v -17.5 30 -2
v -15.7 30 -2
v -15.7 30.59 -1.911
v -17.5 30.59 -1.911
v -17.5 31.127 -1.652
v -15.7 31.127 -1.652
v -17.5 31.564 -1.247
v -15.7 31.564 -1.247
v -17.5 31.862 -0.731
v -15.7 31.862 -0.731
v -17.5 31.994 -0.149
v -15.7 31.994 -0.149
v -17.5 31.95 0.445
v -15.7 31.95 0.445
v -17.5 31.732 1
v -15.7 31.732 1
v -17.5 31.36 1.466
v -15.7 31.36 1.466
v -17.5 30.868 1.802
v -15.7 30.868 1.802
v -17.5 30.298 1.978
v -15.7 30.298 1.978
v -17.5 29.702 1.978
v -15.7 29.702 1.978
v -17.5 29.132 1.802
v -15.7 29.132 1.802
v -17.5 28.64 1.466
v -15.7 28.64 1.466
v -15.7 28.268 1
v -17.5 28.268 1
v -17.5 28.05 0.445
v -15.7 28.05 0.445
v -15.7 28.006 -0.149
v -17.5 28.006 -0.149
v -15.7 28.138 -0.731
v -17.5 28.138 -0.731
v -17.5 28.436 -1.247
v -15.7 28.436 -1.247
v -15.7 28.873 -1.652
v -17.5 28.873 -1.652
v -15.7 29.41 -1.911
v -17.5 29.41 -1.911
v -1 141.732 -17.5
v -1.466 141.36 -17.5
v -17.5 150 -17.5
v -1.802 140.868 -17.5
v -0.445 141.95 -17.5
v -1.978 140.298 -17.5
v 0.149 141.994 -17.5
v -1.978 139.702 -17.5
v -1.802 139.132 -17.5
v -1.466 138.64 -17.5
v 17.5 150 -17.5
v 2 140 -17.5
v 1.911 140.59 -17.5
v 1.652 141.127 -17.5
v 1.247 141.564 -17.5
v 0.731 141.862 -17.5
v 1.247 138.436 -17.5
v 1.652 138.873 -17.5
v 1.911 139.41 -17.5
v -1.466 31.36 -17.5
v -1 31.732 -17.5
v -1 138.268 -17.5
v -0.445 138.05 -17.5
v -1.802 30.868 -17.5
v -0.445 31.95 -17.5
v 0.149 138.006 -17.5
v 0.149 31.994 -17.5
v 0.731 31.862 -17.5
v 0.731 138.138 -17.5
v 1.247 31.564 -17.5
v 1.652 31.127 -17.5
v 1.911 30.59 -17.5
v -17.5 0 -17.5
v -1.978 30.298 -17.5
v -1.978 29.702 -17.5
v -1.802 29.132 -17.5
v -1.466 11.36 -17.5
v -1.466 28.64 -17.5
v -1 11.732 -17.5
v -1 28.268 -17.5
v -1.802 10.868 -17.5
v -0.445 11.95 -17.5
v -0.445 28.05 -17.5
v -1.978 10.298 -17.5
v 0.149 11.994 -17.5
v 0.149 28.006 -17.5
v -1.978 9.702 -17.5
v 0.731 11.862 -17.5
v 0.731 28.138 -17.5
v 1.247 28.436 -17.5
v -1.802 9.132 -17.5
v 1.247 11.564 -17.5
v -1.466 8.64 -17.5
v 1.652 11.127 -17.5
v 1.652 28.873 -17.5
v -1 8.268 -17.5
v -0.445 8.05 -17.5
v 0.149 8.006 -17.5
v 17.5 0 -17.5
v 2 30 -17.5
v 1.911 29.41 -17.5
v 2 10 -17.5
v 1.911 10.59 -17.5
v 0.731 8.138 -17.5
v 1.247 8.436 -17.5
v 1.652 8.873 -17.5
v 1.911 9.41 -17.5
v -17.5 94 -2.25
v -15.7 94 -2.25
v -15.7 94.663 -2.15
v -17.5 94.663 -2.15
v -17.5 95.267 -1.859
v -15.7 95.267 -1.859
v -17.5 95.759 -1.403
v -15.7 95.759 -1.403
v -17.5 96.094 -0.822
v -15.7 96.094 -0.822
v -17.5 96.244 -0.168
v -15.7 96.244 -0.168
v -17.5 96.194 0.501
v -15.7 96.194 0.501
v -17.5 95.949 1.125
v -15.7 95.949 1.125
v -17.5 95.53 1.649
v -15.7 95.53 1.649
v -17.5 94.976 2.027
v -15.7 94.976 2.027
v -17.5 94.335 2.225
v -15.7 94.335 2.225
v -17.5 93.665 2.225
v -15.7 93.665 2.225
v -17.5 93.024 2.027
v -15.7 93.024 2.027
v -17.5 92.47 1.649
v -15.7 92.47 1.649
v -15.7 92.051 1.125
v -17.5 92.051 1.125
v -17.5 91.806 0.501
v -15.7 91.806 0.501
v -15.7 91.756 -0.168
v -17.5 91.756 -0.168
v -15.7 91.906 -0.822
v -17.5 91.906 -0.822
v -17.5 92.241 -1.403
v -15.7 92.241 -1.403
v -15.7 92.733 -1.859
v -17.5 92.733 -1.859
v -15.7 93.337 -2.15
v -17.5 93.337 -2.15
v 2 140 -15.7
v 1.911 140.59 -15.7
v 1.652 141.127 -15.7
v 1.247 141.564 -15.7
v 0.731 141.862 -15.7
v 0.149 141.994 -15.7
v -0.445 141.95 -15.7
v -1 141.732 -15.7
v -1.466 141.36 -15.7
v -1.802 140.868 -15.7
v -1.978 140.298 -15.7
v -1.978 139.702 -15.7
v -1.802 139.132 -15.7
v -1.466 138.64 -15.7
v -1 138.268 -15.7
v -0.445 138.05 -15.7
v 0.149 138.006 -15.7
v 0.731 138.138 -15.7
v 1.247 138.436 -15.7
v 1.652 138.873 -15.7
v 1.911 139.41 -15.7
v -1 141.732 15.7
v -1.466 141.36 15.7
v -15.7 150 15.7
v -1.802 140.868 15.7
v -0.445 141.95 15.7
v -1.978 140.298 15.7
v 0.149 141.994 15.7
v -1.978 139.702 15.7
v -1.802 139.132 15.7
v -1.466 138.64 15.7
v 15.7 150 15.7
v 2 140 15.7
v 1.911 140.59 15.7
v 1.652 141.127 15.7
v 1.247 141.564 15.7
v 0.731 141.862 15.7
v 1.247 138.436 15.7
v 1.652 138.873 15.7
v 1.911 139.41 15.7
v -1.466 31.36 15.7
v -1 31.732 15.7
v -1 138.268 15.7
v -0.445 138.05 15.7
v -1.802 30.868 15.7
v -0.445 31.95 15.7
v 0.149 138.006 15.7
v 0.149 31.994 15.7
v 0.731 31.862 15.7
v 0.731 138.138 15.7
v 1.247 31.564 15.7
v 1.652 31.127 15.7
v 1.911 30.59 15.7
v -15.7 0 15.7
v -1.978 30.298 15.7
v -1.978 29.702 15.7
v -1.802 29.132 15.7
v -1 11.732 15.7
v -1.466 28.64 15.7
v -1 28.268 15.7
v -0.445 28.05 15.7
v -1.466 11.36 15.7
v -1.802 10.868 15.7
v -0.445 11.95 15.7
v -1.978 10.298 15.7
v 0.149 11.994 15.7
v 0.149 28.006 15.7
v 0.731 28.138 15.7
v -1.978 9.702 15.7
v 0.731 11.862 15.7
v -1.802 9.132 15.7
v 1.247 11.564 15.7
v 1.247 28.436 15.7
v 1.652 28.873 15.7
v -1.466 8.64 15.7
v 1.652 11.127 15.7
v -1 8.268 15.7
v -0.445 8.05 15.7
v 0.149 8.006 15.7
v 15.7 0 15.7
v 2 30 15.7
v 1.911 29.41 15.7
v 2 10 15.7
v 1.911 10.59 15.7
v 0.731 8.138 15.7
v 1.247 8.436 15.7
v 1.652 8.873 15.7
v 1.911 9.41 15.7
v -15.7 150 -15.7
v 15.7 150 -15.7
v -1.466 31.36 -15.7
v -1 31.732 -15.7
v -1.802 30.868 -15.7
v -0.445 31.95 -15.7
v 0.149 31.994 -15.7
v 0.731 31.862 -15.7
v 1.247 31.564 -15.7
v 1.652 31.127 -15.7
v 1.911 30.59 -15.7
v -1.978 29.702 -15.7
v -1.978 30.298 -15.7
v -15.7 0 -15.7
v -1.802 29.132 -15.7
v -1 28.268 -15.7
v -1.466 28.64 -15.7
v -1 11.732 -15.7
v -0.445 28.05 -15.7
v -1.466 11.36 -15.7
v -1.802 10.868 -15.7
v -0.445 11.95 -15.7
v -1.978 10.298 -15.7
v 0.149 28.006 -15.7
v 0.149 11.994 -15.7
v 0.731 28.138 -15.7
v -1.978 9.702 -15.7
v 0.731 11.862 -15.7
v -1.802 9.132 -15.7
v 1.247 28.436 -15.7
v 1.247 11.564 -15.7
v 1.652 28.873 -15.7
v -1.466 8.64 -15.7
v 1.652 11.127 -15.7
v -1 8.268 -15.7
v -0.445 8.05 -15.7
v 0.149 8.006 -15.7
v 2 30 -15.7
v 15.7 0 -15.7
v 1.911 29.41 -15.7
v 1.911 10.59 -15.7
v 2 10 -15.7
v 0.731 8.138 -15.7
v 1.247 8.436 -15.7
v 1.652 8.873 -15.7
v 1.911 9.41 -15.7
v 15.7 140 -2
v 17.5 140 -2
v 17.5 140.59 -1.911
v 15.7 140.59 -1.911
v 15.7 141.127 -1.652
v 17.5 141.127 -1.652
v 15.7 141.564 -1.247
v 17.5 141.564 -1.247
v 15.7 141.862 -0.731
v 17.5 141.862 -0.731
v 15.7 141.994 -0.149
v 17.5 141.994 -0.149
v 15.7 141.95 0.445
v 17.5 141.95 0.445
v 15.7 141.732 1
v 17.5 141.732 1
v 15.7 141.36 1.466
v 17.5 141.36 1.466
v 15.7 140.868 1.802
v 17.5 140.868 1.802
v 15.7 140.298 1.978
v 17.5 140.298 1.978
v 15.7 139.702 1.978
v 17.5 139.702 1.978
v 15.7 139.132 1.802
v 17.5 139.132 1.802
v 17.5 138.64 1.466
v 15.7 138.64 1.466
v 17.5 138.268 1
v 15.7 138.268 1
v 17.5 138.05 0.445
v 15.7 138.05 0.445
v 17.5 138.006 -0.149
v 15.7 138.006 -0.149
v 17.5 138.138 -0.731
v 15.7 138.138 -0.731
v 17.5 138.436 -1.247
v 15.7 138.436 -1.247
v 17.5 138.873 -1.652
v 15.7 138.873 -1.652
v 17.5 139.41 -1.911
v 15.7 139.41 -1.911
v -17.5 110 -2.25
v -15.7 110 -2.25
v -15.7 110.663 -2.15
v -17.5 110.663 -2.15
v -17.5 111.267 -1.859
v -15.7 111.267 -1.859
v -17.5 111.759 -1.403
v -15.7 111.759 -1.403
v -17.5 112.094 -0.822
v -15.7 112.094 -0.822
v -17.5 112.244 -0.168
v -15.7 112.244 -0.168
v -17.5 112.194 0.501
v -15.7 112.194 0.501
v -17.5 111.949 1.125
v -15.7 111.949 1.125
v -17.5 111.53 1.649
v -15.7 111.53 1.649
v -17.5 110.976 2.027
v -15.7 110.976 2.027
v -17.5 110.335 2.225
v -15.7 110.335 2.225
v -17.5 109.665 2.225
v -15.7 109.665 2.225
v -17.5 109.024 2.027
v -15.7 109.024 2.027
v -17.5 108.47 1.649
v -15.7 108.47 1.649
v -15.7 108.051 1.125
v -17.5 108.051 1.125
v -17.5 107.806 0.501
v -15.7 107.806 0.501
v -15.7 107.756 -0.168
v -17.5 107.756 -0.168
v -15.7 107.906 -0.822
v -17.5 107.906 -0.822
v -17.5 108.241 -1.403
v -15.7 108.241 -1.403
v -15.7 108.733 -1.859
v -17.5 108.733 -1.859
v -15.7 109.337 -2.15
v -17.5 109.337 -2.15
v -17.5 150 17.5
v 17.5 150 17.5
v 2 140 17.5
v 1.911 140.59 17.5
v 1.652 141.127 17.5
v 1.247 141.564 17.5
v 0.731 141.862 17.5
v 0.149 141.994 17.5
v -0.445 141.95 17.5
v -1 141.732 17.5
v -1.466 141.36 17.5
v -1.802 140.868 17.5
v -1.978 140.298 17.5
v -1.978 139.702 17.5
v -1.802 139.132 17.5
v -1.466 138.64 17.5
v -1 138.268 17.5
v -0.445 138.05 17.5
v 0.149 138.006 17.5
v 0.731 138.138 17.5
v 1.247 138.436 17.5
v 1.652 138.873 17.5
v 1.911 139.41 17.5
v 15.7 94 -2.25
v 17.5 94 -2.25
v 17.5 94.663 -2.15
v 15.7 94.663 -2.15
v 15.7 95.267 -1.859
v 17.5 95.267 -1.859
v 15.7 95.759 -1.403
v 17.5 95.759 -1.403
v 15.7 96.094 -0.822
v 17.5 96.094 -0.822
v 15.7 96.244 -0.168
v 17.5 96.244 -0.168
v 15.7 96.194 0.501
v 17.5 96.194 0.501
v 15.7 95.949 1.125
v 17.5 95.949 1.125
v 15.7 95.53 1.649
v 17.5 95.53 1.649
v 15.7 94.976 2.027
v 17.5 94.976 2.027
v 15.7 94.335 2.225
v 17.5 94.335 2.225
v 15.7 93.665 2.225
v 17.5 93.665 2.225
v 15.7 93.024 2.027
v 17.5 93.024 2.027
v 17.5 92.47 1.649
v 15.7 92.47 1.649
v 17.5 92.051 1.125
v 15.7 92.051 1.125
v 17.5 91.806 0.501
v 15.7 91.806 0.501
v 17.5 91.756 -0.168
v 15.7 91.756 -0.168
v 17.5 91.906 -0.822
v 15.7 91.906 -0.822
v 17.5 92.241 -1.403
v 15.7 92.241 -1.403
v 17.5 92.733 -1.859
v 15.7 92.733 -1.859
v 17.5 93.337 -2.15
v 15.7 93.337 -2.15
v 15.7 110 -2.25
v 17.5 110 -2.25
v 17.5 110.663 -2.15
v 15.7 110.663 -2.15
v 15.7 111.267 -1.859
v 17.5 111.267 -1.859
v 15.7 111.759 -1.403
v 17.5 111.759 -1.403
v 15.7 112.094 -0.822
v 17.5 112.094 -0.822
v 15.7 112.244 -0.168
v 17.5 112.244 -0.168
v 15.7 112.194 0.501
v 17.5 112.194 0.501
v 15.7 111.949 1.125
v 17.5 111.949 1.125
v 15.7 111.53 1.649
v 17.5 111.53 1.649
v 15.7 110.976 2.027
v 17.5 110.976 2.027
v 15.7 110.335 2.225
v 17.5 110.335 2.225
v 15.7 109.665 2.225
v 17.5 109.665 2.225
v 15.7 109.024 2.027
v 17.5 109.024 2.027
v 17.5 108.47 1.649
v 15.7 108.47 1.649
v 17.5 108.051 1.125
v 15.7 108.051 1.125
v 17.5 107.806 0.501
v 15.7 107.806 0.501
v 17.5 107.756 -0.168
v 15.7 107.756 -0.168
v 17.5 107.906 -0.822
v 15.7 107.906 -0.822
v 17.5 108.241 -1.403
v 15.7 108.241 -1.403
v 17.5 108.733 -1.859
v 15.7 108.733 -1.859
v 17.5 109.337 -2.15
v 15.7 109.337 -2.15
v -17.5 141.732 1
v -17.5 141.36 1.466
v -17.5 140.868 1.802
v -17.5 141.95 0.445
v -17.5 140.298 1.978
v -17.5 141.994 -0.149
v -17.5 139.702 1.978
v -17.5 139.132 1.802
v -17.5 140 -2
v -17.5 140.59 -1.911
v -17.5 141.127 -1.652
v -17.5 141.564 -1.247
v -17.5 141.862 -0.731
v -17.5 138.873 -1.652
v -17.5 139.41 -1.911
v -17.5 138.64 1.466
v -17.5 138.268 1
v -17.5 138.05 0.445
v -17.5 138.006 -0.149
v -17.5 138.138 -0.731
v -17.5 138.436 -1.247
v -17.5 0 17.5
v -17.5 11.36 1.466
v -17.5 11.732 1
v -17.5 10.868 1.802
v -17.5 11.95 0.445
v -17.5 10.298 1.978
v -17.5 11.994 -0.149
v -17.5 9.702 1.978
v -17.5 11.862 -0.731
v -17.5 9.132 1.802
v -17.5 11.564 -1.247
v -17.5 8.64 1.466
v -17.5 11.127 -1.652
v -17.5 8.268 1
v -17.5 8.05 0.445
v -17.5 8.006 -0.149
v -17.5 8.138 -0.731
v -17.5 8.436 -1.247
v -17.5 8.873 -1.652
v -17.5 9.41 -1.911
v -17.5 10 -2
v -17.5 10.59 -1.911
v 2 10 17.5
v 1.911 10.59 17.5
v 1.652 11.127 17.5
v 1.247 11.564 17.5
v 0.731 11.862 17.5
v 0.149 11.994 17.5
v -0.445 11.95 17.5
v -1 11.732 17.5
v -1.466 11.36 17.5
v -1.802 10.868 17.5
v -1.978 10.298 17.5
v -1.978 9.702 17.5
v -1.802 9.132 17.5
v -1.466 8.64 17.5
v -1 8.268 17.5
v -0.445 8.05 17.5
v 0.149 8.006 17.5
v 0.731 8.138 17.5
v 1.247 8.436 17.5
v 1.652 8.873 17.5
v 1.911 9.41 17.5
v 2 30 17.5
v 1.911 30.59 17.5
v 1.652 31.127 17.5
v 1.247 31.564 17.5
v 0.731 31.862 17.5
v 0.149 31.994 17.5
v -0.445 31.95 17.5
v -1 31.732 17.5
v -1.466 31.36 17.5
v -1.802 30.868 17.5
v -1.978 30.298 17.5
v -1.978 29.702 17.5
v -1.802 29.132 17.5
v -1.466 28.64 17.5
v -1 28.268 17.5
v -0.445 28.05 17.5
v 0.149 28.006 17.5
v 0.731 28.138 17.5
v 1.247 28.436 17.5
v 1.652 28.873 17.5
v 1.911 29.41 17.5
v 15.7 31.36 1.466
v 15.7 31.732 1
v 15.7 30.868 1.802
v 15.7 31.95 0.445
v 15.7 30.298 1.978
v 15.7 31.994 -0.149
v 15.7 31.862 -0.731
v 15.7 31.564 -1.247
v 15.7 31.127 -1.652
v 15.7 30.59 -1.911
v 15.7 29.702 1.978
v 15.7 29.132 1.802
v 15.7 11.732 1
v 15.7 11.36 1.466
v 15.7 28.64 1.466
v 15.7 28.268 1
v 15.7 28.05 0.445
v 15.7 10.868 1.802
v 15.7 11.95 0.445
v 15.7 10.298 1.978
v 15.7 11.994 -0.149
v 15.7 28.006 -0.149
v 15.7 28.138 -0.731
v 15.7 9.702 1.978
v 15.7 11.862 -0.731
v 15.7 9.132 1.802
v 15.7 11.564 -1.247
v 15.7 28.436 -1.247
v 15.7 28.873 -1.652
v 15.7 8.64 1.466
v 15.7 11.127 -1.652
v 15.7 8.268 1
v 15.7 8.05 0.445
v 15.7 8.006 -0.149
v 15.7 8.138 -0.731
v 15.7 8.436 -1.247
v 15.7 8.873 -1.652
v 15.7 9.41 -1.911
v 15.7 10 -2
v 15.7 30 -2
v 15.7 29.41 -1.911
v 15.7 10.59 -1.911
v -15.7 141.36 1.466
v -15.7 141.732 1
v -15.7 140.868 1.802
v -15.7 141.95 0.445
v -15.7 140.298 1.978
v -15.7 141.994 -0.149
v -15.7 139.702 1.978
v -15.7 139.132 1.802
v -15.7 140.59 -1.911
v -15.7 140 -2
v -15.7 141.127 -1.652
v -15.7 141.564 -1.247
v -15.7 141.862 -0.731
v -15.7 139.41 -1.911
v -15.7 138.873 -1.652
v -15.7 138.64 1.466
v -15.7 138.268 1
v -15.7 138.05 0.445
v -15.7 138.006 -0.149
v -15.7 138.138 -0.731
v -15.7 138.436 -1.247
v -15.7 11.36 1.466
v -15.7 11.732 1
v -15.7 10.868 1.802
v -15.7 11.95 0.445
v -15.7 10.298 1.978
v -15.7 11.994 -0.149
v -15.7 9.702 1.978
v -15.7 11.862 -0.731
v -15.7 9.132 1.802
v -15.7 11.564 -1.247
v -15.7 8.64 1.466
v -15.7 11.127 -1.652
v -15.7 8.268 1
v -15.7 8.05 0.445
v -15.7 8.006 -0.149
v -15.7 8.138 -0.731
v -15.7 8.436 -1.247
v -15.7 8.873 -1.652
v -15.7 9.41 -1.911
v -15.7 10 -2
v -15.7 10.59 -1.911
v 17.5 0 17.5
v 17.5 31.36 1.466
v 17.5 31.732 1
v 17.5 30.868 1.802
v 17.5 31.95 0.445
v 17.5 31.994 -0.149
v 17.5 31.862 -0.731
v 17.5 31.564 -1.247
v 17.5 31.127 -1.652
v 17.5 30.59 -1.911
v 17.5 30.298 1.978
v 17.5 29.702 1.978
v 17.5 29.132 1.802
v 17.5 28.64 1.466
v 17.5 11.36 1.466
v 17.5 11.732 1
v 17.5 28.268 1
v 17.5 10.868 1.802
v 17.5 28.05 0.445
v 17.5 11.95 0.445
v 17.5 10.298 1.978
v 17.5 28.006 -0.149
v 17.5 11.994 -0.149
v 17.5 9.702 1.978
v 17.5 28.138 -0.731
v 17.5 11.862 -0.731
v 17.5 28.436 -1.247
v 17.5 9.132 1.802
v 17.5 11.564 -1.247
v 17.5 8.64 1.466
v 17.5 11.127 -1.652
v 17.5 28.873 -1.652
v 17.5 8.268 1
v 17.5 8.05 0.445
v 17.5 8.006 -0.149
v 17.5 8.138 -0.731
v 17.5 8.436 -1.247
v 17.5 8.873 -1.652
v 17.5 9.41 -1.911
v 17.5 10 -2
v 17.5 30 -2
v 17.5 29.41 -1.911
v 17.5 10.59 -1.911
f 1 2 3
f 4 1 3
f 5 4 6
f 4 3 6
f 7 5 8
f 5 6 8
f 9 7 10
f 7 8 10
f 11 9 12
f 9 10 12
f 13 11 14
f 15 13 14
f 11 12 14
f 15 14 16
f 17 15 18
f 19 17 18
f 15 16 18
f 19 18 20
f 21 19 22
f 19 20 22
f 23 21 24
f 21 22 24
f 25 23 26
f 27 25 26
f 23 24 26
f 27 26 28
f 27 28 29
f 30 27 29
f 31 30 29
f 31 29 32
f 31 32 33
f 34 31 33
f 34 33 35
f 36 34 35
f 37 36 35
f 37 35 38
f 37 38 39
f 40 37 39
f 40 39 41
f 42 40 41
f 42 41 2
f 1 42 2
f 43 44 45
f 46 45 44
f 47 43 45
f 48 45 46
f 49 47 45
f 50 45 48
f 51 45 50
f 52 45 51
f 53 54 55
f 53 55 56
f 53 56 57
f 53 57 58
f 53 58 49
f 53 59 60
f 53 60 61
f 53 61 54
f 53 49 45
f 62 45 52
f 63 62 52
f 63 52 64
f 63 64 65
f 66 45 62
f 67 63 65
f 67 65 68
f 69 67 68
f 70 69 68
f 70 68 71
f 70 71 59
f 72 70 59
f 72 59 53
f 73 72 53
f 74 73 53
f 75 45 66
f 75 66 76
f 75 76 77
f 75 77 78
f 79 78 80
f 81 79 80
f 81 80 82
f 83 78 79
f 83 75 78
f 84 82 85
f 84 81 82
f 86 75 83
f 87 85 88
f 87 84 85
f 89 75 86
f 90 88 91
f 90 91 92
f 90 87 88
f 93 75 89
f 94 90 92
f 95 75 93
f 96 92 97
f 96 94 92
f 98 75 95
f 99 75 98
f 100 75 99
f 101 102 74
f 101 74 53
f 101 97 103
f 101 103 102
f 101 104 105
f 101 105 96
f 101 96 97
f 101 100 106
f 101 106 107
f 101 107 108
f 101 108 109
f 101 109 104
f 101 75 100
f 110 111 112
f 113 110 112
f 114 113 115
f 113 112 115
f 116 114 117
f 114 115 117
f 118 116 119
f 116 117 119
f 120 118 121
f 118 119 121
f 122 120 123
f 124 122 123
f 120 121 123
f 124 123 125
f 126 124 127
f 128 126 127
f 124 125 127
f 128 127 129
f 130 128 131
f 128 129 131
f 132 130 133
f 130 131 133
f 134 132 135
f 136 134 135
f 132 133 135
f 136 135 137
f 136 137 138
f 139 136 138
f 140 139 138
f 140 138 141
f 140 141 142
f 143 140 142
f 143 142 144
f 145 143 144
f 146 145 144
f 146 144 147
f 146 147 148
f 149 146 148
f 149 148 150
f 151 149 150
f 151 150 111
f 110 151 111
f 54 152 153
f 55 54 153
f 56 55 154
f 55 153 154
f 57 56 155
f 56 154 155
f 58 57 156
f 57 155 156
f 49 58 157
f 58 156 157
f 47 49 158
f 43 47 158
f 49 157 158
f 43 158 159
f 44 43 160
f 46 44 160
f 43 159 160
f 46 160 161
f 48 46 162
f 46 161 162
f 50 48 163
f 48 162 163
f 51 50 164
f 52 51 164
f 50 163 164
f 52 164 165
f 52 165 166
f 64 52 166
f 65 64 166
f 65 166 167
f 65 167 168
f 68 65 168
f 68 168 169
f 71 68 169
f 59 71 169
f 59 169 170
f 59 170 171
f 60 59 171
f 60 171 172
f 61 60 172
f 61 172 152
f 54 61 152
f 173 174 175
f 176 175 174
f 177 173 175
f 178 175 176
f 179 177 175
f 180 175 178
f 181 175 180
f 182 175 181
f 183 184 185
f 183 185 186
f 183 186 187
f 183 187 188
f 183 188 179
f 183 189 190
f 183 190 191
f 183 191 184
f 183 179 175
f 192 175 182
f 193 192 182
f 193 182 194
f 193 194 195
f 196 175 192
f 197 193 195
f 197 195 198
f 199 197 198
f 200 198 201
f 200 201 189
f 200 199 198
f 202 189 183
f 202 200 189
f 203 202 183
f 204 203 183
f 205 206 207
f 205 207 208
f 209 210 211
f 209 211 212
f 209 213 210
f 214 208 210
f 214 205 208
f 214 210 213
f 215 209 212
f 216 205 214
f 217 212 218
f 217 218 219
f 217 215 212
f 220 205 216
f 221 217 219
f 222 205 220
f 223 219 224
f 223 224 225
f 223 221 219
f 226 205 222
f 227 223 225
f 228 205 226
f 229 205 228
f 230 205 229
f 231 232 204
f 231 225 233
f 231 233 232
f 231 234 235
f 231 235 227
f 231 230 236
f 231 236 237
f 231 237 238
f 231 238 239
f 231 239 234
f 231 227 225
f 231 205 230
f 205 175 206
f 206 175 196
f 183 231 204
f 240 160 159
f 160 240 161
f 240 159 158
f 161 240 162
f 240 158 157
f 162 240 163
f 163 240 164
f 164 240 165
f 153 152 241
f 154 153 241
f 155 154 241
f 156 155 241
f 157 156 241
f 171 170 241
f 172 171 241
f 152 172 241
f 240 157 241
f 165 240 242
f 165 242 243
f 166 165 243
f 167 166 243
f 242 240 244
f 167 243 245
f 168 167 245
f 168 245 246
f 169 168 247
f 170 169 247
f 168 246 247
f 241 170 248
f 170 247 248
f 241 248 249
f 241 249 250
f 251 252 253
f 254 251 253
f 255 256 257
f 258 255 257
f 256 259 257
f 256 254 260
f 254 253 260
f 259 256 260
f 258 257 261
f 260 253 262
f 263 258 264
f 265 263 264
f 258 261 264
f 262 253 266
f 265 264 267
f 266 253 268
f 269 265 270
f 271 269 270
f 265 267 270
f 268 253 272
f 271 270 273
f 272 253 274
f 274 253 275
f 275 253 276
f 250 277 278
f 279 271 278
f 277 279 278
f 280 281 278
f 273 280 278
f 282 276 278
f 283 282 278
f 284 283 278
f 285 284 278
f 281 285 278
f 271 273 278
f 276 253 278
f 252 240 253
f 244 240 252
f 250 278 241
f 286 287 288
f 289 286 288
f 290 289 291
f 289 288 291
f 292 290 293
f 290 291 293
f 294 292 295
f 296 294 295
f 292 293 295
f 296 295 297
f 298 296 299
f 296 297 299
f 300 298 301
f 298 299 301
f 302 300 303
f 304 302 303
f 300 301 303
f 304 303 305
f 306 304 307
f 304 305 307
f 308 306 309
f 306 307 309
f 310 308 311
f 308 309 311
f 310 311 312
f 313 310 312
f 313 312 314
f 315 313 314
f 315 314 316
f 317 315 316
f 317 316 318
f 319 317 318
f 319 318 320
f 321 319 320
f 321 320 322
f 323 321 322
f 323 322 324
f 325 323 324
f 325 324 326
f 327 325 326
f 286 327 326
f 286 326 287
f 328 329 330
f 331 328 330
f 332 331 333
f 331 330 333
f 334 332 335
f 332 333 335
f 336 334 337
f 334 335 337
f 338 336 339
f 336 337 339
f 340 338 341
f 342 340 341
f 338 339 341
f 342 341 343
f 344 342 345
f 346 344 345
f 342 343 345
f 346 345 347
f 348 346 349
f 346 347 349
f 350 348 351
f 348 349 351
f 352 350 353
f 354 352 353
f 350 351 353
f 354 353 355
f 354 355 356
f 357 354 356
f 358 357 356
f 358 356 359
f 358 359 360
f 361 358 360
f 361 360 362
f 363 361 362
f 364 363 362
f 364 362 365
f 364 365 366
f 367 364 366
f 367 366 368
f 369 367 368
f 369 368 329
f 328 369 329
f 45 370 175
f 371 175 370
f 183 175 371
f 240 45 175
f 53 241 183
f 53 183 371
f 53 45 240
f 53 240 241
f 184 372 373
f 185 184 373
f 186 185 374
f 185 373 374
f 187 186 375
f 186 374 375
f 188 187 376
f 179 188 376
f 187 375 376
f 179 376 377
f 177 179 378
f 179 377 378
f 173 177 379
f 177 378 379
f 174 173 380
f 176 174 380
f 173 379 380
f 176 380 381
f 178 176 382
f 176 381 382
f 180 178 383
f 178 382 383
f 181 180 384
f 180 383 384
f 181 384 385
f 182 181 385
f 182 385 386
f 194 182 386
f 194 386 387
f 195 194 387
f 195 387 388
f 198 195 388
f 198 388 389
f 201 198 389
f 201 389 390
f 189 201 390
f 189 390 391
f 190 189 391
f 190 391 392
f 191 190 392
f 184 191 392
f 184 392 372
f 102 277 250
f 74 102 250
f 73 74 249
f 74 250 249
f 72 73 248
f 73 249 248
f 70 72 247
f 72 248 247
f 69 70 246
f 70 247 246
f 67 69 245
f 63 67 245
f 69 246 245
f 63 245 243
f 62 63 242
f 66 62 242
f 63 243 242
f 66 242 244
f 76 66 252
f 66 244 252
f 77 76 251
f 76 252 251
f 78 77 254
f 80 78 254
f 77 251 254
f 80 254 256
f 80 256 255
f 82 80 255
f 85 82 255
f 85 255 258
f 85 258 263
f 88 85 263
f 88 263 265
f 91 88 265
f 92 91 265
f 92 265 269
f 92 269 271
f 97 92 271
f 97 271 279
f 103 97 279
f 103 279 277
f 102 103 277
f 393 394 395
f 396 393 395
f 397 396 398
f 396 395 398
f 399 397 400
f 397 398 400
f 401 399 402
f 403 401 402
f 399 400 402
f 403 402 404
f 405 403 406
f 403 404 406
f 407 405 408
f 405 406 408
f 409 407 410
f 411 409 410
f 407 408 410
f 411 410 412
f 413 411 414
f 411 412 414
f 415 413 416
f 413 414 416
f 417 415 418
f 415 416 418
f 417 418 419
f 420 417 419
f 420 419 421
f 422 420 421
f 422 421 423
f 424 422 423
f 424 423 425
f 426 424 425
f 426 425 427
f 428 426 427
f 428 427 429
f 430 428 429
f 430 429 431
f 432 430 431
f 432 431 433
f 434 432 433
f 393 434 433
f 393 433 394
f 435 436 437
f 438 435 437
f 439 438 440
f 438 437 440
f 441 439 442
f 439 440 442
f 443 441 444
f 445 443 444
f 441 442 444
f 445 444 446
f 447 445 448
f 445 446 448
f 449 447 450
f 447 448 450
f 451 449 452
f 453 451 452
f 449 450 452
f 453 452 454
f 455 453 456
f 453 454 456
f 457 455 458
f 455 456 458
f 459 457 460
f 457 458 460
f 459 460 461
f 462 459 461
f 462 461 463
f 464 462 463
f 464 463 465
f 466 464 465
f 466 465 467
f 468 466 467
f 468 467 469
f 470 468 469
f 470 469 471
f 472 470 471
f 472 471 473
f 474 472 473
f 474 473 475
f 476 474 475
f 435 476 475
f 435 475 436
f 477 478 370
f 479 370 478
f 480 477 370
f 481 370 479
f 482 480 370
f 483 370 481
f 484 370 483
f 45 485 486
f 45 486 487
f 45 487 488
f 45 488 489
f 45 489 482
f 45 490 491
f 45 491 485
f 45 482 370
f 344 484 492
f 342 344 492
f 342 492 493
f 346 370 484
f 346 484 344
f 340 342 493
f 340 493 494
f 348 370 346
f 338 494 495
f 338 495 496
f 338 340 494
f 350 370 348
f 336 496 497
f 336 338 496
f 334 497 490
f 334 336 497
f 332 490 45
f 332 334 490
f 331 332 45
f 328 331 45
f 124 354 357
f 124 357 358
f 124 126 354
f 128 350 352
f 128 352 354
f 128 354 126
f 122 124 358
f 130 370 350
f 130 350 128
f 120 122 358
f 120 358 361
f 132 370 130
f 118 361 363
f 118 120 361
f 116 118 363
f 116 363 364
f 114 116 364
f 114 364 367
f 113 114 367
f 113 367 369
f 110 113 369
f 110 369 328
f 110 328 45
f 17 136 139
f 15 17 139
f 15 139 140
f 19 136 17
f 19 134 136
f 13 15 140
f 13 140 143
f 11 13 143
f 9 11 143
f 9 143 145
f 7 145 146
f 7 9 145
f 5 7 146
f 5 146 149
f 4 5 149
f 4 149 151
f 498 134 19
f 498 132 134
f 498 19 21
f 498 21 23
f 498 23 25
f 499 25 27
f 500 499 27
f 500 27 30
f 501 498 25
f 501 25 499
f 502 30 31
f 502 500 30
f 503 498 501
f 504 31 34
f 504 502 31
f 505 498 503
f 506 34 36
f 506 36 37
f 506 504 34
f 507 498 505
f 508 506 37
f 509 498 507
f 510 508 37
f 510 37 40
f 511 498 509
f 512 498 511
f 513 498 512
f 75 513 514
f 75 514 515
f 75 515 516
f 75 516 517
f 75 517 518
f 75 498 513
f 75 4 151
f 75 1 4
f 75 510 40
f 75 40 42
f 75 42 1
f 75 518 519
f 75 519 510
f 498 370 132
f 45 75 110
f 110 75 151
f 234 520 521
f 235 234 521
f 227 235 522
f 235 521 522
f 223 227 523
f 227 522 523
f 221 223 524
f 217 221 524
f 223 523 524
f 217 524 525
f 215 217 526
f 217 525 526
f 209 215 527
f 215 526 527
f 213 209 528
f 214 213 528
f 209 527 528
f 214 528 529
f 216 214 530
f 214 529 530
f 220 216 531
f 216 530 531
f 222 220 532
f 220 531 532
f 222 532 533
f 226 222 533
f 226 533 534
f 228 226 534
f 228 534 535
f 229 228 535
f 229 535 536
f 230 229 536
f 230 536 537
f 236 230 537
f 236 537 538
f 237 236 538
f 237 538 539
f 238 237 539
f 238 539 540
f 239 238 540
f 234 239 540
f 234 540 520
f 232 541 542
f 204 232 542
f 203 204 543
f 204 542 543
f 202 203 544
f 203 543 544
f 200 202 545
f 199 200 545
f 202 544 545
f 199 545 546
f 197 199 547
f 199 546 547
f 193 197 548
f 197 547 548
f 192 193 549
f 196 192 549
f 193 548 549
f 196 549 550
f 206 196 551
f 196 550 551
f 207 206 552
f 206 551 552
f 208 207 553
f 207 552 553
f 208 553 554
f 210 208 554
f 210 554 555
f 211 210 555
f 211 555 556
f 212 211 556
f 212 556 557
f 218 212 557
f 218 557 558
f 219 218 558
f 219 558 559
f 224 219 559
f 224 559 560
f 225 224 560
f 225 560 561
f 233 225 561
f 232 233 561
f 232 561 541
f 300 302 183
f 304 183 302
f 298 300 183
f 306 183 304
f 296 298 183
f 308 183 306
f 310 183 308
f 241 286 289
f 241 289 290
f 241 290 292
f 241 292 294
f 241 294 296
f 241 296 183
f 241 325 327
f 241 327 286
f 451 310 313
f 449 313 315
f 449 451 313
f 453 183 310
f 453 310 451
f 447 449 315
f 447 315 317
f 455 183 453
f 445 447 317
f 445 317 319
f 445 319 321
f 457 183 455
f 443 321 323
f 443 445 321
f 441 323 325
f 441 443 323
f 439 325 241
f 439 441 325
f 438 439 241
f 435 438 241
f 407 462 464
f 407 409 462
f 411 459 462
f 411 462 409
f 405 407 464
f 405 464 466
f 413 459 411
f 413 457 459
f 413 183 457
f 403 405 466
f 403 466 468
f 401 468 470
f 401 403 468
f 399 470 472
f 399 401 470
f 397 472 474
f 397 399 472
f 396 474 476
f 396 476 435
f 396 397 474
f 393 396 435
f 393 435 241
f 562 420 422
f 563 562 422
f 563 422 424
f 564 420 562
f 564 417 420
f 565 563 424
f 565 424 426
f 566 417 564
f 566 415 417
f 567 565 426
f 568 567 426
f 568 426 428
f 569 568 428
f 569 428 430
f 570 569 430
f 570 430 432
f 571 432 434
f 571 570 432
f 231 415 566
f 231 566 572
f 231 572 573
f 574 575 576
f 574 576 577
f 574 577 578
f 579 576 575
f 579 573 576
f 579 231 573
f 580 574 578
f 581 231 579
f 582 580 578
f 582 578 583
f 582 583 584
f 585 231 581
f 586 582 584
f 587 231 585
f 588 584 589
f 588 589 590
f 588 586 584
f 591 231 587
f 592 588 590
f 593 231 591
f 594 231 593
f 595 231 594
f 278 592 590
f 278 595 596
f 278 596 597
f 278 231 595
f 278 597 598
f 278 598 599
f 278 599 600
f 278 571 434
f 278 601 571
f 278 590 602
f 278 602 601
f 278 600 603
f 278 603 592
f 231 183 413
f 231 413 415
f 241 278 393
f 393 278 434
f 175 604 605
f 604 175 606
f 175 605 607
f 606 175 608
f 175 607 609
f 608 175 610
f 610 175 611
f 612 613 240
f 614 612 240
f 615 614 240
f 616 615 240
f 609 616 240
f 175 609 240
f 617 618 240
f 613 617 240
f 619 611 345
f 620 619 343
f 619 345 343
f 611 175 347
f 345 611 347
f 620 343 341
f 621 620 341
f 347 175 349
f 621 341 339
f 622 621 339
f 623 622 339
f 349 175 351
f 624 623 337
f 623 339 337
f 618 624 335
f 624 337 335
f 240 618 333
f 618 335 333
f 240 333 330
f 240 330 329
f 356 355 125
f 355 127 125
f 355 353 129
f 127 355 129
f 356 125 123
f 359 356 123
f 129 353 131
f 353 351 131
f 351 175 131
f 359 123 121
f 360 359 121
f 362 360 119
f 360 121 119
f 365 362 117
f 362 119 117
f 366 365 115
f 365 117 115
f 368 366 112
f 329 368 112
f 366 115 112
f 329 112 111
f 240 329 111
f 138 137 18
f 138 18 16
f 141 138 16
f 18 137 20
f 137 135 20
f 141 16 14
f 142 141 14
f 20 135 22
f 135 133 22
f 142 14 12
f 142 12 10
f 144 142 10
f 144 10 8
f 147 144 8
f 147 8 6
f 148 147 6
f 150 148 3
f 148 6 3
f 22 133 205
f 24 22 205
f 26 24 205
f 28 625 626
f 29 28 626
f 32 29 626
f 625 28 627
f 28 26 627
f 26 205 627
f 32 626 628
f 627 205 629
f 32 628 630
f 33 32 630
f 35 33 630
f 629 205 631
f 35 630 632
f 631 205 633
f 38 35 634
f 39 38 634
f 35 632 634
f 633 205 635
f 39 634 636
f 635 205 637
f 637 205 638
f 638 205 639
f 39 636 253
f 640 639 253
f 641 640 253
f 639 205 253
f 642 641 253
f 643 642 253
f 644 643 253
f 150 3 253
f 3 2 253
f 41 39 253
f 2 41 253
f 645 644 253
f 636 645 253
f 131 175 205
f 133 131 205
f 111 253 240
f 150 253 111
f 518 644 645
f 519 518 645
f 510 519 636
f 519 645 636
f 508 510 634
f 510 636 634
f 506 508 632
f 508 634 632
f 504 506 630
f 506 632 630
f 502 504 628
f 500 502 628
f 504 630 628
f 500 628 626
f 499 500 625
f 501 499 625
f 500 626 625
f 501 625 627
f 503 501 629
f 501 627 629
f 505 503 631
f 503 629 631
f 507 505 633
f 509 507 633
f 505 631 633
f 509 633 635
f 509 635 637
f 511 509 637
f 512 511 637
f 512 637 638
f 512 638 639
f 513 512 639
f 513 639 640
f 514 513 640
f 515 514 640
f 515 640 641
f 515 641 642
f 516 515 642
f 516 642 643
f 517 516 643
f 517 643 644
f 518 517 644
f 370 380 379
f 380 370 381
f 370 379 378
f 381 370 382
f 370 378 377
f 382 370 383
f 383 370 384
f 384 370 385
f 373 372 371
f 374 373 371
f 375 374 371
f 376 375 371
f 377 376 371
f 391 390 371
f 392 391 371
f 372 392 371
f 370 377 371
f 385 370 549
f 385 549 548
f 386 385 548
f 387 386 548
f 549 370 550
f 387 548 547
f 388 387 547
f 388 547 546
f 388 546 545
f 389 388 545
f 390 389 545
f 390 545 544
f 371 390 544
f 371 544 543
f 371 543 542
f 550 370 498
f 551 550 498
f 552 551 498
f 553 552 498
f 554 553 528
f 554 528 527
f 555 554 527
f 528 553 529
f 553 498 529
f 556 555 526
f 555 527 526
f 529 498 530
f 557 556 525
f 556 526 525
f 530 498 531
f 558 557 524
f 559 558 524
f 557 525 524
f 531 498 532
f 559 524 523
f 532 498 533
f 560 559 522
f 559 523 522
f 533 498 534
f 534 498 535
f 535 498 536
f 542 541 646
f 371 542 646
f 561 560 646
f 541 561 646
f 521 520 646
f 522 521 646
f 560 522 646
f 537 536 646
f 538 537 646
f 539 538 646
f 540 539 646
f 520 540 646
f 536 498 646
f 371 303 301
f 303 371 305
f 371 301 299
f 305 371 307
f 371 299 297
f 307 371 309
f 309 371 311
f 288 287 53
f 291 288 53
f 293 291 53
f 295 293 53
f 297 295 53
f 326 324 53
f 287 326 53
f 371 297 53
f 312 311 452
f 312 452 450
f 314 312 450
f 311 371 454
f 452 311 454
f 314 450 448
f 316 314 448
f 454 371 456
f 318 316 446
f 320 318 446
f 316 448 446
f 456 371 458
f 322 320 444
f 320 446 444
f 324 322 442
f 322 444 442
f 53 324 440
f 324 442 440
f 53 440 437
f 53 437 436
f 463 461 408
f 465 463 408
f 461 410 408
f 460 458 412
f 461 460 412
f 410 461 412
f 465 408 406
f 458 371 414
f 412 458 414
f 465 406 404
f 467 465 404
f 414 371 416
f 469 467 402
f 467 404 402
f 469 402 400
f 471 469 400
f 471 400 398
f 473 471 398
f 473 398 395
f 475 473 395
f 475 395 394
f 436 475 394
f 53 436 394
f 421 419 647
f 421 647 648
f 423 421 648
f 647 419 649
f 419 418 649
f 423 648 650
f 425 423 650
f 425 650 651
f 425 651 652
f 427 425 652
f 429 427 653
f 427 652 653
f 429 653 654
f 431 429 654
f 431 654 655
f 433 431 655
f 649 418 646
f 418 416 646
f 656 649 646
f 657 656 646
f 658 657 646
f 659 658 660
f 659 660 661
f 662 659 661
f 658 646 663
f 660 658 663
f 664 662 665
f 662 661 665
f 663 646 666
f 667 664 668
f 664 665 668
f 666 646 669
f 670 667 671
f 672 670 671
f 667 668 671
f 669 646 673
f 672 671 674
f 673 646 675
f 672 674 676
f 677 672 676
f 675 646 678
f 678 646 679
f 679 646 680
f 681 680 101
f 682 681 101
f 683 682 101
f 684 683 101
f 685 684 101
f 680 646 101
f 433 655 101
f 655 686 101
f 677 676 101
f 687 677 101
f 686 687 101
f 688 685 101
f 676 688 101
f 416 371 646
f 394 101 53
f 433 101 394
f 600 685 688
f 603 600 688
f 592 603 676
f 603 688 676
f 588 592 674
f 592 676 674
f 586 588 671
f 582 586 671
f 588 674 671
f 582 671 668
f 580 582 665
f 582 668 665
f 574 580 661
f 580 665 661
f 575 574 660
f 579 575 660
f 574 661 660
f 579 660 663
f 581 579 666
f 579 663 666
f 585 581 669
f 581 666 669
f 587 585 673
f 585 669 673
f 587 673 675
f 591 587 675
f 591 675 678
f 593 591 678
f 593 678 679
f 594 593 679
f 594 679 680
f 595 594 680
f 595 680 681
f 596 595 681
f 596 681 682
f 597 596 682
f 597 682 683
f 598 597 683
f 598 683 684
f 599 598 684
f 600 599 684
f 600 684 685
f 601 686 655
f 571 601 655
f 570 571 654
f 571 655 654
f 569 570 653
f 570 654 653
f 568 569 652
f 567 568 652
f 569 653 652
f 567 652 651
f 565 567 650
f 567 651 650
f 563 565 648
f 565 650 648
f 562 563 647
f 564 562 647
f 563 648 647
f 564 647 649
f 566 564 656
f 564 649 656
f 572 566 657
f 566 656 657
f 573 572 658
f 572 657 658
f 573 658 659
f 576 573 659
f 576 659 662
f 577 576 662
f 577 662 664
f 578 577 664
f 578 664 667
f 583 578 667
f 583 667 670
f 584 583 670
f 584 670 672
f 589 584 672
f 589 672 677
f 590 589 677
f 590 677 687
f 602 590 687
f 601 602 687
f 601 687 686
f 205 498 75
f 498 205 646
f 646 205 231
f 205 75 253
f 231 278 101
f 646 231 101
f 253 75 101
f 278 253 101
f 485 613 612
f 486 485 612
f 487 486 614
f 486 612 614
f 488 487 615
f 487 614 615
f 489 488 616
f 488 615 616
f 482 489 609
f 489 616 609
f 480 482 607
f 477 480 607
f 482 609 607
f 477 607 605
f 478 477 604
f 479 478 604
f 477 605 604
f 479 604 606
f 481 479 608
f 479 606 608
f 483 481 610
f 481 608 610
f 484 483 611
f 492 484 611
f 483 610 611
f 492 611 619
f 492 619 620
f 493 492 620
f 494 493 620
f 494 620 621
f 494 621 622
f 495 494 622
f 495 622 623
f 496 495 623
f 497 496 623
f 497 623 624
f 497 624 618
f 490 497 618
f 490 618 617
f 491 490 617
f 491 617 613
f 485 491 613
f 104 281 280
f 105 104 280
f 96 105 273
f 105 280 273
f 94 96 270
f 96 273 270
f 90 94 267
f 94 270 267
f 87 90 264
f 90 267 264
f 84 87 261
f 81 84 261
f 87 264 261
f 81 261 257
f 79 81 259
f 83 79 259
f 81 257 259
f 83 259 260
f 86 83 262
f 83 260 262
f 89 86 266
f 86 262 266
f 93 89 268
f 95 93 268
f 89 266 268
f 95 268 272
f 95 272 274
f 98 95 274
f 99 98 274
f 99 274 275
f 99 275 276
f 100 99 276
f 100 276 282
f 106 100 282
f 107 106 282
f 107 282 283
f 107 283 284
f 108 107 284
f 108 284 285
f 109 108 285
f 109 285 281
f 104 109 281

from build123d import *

# Parameters (mm, degrees)
SKETCH1_W           = 35
SKETCH1_H           = 35
SKETCH1_W_2         = 31.4
SKETCH1_H_2         = 31.4
BOSS_EXTRUDE1_DEPTH = 150
SKETCH3_R           = 2
CUT_EXTRUDE1_DEPTH  = 156.020159979
SKETCH4_R           = 2
CUT_EXTRUDE2_DEPTH  = 156.020159979
SKETCH7_R           = 2
CUT_EXTRUDE5_DEPTH  = 40
SKETCH9_R           = 2
CUT_EXTRUDE6_DEPTH  = 40
SKETCH11_R          = 2.25
CUT_EXTRUDE8_DEPTH  = 156.020159979


with BuildPart() as part:
    # Sketch1 → Boss-Extrude1 (new body)
    with BuildSketch(Plane(origin=(0, 0, 0), x_dir=(1, 0, 0), z_dir=(0, 1, 0))):
        Rectangle(SKETCH1_W, SKETCH1_H)
        Rectangle(SKETCH1_W_2, SKETCH1_H_2, mode=Mode.SUBTRACT)
    extrude(amount=BOSS_EXTRUDE1_DEPTH)

    # Sketch3 → Cut-Extrude1 (cut, through all)
    with BuildSketch(Plane.XY.offset(17.5)):
        with Locations((0, 10)):
            Circle(SKETCH3_R)
        with Locations((0, 30)):
            Circle(SKETCH3_R)
    extrude(amount=-CUT_EXTRUDE1_DEPTH, mode=Mode.SUBTRACT)

    # Sketch4 → Cut-Extrude2 (cut, through all)
    with BuildSketch(Plane(origin=(17.5, 0, 0), x_dir=(0, 0, -1), z_dir=(1, 0, 0))):
        with Locations((0, 10)):
            Circle(SKETCH4_R)
        with Locations((0, 30)):
            Circle(SKETCH4_R)
    extrude(amount=-CUT_EXTRUDE2_DEPTH, mode=Mode.SUBTRACT)

    # Sketch7 → Cut-Extrude5 (cut)
    with BuildSketch(Plane(origin=(17.5, 0, 0), x_dir=(0, 0, -1), z_dir=(1, 0, 0))):
        with Locations((0, 140)):
            Circle(SKETCH7_R)
    extrude(amount=-CUT_EXTRUDE5_DEPTH, mode=Mode.SUBTRACT)

    # Sketch9 → Cut-Extrude6 (cut)
    with BuildSketch(Plane.XY.offset(17.5)):
        with Locations((0, 140)):
            Circle(SKETCH9_R)
    extrude(amount=-CUT_EXTRUDE6_DEPTH, mode=Mode.SUBTRACT)

    # Sketch11 → Cut-Extrude8 (cut, through all)
    with BuildSketch(Plane(origin=(17.5, 0, 0), x_dir=(0, 0, -1), z_dir=(1, 0, 0))):
        with Locations((0, 110)):
            Circle(SKETCH11_R)
        with Locations((0, 94)):
            Circle(SKETCH11_R)
    extrude(amount=-CUT_EXTRUDE8_DEPTH, mode=Mode.SUBTRACT)


solid = part.part
